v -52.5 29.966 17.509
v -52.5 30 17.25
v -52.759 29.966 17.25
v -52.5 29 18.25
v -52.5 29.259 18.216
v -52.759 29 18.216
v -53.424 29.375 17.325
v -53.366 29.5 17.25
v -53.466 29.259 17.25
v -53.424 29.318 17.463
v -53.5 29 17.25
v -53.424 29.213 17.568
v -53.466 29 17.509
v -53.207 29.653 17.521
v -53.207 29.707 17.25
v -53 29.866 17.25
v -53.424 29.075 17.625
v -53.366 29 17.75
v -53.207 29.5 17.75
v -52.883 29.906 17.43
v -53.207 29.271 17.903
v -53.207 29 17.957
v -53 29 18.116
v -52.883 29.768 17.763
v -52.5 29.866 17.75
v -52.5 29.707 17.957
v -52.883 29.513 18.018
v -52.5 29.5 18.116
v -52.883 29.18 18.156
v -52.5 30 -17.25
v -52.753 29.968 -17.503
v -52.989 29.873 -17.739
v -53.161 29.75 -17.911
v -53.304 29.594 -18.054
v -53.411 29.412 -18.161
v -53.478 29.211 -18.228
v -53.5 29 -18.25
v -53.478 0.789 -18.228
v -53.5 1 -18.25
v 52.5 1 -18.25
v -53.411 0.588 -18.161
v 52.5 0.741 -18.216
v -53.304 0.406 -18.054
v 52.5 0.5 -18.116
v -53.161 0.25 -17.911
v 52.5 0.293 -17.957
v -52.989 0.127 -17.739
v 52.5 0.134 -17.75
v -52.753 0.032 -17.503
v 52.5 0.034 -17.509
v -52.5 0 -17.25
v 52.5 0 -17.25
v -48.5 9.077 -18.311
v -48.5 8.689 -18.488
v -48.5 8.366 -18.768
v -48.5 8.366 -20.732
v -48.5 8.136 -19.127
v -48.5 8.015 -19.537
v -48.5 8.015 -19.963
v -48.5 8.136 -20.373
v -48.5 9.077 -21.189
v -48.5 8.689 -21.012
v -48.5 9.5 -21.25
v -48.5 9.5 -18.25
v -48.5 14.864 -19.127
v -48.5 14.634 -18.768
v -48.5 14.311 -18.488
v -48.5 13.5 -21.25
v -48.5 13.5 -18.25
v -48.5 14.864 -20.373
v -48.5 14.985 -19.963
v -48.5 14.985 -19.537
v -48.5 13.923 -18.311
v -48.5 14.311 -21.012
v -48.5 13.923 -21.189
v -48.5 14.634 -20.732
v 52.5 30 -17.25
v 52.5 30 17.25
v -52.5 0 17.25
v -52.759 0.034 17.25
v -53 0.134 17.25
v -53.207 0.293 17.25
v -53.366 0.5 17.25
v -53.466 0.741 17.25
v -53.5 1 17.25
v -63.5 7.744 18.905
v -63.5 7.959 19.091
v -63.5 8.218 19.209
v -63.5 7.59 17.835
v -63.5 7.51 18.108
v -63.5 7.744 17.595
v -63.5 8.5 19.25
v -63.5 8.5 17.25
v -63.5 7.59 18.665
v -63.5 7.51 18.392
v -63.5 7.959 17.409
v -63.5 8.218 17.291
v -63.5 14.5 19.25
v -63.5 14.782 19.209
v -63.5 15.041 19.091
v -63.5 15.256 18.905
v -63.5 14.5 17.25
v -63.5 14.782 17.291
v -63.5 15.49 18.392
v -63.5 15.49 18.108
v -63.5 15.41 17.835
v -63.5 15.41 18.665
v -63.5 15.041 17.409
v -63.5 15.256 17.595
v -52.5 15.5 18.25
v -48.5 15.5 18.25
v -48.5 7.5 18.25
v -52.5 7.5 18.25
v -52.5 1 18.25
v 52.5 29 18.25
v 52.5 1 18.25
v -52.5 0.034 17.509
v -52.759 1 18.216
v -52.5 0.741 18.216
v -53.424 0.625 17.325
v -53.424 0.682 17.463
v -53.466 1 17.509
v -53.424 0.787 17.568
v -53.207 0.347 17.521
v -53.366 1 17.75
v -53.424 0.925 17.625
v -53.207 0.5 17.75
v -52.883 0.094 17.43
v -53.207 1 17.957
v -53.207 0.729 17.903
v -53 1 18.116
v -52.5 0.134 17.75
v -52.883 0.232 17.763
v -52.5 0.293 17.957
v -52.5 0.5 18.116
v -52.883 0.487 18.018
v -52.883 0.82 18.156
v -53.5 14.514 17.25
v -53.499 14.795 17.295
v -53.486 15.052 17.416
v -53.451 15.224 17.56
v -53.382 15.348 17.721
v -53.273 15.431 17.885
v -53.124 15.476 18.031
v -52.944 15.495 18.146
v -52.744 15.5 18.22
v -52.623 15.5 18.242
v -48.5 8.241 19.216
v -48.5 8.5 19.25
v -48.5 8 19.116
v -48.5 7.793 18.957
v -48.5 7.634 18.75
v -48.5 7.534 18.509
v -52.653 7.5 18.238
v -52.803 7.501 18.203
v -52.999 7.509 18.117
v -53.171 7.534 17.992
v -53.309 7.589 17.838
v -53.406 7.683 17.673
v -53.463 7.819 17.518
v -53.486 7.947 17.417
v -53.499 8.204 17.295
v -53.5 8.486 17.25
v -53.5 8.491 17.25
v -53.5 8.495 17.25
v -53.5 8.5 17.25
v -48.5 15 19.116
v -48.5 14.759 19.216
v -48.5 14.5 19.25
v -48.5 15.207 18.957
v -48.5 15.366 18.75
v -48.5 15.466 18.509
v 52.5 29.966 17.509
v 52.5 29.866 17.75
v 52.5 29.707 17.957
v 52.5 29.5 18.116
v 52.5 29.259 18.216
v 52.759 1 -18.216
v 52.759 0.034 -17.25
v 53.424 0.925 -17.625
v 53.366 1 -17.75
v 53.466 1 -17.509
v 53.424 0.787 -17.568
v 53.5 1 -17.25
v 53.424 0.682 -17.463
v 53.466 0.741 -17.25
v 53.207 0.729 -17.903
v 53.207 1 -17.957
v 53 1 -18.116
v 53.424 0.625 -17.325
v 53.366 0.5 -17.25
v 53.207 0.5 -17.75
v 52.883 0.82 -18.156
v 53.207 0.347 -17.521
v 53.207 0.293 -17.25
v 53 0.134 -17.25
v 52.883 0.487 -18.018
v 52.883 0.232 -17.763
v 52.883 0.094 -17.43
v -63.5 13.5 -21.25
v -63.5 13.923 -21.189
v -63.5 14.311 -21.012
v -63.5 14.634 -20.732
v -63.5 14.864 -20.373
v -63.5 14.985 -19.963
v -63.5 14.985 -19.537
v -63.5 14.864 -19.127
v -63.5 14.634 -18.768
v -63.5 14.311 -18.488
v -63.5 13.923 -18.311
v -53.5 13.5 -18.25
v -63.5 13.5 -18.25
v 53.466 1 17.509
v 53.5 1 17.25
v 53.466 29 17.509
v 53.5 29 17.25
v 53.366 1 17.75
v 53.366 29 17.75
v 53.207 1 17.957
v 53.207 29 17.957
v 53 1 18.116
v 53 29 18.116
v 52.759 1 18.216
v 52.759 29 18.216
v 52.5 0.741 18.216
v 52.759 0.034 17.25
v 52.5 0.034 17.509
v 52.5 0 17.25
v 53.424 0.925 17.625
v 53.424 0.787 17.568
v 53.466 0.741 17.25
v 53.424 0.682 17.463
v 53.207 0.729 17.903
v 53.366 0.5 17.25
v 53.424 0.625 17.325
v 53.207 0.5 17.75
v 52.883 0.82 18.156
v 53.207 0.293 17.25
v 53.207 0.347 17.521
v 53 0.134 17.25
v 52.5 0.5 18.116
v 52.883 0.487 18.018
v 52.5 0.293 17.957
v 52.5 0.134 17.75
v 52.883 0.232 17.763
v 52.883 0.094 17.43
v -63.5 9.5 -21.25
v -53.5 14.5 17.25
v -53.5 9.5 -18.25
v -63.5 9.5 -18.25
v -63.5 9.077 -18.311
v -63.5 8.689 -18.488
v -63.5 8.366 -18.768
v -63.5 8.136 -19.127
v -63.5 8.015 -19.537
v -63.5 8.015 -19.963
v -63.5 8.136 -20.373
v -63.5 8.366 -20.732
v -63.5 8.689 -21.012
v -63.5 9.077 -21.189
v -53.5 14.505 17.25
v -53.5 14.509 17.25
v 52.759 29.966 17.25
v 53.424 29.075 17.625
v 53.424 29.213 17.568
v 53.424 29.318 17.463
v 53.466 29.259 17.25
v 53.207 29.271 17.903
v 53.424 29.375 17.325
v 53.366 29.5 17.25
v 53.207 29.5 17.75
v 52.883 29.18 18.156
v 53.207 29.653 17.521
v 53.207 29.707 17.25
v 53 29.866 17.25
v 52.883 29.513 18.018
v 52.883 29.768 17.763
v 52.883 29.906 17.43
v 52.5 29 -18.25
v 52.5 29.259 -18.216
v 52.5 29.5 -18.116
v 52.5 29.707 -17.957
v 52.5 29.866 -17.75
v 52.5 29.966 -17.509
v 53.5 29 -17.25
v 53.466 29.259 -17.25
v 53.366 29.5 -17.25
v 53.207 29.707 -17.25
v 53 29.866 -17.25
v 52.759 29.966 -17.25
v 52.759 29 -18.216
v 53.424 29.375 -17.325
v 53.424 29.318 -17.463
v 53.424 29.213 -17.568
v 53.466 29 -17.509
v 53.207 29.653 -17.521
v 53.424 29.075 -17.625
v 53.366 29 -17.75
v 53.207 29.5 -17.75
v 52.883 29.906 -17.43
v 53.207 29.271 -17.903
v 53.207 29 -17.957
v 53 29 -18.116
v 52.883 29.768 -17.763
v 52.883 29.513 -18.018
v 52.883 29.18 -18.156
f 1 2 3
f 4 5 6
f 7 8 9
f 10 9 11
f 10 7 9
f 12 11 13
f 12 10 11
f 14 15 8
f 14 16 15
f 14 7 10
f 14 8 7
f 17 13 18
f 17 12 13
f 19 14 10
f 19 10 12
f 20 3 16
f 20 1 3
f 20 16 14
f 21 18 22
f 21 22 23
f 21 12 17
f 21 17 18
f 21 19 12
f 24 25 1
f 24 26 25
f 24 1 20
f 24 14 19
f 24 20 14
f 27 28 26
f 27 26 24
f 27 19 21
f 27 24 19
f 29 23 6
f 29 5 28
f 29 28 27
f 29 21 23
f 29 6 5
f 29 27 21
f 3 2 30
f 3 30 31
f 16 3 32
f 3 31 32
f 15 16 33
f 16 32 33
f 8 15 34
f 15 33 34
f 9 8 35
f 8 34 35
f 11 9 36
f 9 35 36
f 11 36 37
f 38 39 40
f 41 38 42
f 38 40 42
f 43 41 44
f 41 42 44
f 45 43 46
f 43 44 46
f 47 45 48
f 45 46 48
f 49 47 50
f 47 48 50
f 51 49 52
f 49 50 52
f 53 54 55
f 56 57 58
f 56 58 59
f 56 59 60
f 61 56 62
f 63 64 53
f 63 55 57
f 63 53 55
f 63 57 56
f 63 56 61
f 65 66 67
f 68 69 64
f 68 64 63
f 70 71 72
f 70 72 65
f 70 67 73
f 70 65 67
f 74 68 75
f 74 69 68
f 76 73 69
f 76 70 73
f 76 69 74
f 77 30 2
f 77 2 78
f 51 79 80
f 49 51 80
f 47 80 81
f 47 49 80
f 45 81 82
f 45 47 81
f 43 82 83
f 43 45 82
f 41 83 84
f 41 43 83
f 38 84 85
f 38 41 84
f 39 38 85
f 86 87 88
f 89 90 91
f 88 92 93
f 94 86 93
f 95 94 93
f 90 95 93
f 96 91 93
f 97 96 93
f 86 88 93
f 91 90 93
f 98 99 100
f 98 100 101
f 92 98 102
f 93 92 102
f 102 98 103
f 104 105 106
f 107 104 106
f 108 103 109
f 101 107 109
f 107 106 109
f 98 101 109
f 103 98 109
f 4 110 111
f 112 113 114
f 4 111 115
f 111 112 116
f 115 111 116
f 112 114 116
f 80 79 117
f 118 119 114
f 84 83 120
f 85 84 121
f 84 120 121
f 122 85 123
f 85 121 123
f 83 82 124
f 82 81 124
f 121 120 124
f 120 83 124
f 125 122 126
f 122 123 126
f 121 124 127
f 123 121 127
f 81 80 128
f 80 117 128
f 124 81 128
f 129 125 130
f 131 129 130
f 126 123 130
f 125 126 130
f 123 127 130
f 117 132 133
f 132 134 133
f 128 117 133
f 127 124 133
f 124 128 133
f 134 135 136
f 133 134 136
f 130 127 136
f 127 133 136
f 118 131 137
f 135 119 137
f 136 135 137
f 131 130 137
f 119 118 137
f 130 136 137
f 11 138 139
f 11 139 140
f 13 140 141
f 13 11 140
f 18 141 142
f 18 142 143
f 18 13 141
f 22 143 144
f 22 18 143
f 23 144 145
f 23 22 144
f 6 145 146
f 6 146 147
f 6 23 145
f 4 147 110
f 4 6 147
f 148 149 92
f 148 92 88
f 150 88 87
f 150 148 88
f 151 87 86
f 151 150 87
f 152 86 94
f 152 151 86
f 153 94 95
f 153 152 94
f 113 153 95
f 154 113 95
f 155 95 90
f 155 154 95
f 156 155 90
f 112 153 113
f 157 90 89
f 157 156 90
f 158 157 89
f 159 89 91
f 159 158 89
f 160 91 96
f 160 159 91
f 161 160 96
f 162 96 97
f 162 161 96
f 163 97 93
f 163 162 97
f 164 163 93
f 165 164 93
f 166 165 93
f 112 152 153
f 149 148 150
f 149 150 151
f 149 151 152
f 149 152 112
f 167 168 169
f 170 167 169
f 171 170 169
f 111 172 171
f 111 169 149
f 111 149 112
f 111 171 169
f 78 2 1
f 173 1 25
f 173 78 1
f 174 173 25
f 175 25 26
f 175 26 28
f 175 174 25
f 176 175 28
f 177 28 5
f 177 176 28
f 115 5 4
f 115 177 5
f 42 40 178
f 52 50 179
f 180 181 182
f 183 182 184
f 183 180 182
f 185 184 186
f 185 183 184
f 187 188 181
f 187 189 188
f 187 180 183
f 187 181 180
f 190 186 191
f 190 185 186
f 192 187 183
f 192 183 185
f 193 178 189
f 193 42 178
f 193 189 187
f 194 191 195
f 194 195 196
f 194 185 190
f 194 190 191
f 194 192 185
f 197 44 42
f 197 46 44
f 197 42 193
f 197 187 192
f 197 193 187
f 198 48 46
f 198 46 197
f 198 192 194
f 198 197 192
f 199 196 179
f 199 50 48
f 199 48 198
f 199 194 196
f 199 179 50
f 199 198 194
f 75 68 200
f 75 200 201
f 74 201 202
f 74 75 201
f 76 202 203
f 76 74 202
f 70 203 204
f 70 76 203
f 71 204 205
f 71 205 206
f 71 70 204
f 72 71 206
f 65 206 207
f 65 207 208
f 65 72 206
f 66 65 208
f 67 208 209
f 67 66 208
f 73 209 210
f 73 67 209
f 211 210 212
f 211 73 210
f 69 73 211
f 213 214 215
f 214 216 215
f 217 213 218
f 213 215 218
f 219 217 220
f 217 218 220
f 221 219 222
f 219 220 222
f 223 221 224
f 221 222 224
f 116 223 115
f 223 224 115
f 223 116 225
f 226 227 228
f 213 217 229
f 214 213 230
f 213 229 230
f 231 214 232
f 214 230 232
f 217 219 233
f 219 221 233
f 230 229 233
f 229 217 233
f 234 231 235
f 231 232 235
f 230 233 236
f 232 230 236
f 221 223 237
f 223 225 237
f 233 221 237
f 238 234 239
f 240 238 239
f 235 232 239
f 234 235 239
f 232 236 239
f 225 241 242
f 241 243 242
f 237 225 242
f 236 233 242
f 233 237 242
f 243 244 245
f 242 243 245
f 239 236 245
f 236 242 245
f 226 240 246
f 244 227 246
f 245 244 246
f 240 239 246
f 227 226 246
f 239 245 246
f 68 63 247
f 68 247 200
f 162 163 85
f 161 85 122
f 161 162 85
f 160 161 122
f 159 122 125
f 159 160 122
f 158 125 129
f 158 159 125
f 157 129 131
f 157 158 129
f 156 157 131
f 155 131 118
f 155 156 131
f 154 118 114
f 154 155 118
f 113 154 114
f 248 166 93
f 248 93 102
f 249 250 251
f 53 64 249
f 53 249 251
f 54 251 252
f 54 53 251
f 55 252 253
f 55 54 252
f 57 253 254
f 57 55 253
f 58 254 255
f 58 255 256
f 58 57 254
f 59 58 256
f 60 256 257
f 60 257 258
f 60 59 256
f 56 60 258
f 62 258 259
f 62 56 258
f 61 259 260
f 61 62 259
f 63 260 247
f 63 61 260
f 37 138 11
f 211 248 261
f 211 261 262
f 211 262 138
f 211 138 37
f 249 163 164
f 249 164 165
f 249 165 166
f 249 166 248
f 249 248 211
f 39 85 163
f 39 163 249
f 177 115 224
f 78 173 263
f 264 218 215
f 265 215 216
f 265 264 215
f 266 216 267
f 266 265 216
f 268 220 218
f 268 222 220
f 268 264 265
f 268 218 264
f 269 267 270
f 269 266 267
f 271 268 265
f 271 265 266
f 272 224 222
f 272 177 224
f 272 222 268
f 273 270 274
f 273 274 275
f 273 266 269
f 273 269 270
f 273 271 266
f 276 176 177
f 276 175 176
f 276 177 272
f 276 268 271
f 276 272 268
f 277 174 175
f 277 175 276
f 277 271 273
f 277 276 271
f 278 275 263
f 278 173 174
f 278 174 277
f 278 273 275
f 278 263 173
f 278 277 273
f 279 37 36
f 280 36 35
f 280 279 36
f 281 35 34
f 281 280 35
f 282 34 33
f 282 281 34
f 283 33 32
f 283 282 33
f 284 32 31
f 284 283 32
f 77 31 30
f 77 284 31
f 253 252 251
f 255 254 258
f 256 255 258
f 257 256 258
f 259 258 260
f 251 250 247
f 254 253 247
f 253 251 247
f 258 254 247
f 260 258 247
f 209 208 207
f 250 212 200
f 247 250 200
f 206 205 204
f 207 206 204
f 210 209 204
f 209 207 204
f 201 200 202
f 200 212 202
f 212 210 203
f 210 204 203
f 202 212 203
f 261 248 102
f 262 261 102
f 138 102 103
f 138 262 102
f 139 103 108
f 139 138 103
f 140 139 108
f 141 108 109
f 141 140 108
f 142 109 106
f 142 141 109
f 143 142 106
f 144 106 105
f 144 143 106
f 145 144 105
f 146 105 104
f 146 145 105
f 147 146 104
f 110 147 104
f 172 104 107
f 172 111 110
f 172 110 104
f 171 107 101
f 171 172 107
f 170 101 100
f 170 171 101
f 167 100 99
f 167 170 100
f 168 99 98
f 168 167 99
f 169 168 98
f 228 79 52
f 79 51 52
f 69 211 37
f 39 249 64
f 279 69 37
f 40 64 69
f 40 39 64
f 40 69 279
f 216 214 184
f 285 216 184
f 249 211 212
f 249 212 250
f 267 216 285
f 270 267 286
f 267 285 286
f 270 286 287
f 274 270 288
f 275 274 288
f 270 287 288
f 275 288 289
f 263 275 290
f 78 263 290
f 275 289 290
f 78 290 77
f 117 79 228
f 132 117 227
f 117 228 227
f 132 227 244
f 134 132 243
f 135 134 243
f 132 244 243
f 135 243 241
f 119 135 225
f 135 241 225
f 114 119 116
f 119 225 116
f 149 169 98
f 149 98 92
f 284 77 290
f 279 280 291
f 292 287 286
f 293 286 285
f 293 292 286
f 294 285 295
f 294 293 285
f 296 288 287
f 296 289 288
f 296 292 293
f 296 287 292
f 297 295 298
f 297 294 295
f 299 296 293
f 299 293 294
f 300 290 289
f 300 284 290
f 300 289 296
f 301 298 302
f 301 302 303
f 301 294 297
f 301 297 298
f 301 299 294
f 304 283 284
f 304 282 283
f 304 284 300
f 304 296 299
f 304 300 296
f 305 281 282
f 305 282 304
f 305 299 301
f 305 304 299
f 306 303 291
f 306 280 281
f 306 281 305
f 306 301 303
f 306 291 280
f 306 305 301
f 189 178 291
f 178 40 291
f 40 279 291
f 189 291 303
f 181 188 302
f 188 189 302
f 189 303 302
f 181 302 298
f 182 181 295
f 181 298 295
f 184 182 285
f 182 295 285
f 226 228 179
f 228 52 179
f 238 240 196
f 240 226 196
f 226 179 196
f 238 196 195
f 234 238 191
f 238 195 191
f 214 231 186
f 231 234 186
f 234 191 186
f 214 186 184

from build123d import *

# Parameters (mm, degrees)
SKETCH1_W            = 107
SKETCH1_H            = 36.5
BATTERY_DEPTH        = 30
CABLES_DEPTH         = 10
CABLES_DEPTH_BACK    = 5
F_1MM_EDGE_FILLETS_R = 1


with BuildPart() as part:
    # Sketch1 → Battery (new body)
    with BuildSketch(Plane(origin=(0, 0, 0), x_dir=(1, 0, 0), z_dir=(0, 1, 0))):
        Rectangle(SKETCH1_W, SKETCH1_H)
    extrude(amount=BATTERY_DEPTH)

    # Sketch2 → Cables (add, two sides: drawn at the far end of the back side and taken through both)
    with BuildSketch(Plane.ZY.offset(53.5).offset(-CABLES_DEPTH_BACK)):
        with BuildLine():
            Line((-21.25, 9.5), (-21.25, 13.5))
            ThreePointArc((-21.25, 13.5), (-19.75, 15), (-18.25, 13.5))
            Line((-18.25, 13.5), (-18.25, 9.5))
            ThreePointArc((-18.25, 9.5), (-19.75, 8), (-21.25, 9.5))
        make_face()
        with BuildLine():
            Line((17.25, 8.5), (17.25, 14.5))
            ThreePointArc((17.25, 14.5), (18.25, 15.5), (19.25, 14.5))
            Line((19.25, 14.5), (19.25, 8.5))
            ThreePointArc((19.25, 8.5), (18.25, 7.5), (17.25, 8.5))
        make_face()
    extrude(amount=CABLES_DEPTH + CABLES_DEPTH_BACK)

    # 1mm Edge Fillets
    f_1mm_edge_fillets_edges = [part.edges().sort_by_distance(p)[0] for p in [
        (0, 0, 18.25),
        (0, 0, -18.25),
        (-53.5, 0, 0),
        (0, 30, -18.25),
        (0, 30, 18.25),
        (-53.5, 30, 0),
        (53.5, 15, 18.25),
        (53.5, 30, 0),
        (53.5, 15, -18.25),
        (53.5, 0, 0),
        (-53.5, 3.75, 18.25),
        (-53.5, 22.75, 18.25),
    ]]
    fillet(f_1mm_edge_fillets_edges, radius=F_1MM_EDGE_FILLETS_R - 0.0001)  # a hair under: the kernel refuses the full size


solid = part.part
